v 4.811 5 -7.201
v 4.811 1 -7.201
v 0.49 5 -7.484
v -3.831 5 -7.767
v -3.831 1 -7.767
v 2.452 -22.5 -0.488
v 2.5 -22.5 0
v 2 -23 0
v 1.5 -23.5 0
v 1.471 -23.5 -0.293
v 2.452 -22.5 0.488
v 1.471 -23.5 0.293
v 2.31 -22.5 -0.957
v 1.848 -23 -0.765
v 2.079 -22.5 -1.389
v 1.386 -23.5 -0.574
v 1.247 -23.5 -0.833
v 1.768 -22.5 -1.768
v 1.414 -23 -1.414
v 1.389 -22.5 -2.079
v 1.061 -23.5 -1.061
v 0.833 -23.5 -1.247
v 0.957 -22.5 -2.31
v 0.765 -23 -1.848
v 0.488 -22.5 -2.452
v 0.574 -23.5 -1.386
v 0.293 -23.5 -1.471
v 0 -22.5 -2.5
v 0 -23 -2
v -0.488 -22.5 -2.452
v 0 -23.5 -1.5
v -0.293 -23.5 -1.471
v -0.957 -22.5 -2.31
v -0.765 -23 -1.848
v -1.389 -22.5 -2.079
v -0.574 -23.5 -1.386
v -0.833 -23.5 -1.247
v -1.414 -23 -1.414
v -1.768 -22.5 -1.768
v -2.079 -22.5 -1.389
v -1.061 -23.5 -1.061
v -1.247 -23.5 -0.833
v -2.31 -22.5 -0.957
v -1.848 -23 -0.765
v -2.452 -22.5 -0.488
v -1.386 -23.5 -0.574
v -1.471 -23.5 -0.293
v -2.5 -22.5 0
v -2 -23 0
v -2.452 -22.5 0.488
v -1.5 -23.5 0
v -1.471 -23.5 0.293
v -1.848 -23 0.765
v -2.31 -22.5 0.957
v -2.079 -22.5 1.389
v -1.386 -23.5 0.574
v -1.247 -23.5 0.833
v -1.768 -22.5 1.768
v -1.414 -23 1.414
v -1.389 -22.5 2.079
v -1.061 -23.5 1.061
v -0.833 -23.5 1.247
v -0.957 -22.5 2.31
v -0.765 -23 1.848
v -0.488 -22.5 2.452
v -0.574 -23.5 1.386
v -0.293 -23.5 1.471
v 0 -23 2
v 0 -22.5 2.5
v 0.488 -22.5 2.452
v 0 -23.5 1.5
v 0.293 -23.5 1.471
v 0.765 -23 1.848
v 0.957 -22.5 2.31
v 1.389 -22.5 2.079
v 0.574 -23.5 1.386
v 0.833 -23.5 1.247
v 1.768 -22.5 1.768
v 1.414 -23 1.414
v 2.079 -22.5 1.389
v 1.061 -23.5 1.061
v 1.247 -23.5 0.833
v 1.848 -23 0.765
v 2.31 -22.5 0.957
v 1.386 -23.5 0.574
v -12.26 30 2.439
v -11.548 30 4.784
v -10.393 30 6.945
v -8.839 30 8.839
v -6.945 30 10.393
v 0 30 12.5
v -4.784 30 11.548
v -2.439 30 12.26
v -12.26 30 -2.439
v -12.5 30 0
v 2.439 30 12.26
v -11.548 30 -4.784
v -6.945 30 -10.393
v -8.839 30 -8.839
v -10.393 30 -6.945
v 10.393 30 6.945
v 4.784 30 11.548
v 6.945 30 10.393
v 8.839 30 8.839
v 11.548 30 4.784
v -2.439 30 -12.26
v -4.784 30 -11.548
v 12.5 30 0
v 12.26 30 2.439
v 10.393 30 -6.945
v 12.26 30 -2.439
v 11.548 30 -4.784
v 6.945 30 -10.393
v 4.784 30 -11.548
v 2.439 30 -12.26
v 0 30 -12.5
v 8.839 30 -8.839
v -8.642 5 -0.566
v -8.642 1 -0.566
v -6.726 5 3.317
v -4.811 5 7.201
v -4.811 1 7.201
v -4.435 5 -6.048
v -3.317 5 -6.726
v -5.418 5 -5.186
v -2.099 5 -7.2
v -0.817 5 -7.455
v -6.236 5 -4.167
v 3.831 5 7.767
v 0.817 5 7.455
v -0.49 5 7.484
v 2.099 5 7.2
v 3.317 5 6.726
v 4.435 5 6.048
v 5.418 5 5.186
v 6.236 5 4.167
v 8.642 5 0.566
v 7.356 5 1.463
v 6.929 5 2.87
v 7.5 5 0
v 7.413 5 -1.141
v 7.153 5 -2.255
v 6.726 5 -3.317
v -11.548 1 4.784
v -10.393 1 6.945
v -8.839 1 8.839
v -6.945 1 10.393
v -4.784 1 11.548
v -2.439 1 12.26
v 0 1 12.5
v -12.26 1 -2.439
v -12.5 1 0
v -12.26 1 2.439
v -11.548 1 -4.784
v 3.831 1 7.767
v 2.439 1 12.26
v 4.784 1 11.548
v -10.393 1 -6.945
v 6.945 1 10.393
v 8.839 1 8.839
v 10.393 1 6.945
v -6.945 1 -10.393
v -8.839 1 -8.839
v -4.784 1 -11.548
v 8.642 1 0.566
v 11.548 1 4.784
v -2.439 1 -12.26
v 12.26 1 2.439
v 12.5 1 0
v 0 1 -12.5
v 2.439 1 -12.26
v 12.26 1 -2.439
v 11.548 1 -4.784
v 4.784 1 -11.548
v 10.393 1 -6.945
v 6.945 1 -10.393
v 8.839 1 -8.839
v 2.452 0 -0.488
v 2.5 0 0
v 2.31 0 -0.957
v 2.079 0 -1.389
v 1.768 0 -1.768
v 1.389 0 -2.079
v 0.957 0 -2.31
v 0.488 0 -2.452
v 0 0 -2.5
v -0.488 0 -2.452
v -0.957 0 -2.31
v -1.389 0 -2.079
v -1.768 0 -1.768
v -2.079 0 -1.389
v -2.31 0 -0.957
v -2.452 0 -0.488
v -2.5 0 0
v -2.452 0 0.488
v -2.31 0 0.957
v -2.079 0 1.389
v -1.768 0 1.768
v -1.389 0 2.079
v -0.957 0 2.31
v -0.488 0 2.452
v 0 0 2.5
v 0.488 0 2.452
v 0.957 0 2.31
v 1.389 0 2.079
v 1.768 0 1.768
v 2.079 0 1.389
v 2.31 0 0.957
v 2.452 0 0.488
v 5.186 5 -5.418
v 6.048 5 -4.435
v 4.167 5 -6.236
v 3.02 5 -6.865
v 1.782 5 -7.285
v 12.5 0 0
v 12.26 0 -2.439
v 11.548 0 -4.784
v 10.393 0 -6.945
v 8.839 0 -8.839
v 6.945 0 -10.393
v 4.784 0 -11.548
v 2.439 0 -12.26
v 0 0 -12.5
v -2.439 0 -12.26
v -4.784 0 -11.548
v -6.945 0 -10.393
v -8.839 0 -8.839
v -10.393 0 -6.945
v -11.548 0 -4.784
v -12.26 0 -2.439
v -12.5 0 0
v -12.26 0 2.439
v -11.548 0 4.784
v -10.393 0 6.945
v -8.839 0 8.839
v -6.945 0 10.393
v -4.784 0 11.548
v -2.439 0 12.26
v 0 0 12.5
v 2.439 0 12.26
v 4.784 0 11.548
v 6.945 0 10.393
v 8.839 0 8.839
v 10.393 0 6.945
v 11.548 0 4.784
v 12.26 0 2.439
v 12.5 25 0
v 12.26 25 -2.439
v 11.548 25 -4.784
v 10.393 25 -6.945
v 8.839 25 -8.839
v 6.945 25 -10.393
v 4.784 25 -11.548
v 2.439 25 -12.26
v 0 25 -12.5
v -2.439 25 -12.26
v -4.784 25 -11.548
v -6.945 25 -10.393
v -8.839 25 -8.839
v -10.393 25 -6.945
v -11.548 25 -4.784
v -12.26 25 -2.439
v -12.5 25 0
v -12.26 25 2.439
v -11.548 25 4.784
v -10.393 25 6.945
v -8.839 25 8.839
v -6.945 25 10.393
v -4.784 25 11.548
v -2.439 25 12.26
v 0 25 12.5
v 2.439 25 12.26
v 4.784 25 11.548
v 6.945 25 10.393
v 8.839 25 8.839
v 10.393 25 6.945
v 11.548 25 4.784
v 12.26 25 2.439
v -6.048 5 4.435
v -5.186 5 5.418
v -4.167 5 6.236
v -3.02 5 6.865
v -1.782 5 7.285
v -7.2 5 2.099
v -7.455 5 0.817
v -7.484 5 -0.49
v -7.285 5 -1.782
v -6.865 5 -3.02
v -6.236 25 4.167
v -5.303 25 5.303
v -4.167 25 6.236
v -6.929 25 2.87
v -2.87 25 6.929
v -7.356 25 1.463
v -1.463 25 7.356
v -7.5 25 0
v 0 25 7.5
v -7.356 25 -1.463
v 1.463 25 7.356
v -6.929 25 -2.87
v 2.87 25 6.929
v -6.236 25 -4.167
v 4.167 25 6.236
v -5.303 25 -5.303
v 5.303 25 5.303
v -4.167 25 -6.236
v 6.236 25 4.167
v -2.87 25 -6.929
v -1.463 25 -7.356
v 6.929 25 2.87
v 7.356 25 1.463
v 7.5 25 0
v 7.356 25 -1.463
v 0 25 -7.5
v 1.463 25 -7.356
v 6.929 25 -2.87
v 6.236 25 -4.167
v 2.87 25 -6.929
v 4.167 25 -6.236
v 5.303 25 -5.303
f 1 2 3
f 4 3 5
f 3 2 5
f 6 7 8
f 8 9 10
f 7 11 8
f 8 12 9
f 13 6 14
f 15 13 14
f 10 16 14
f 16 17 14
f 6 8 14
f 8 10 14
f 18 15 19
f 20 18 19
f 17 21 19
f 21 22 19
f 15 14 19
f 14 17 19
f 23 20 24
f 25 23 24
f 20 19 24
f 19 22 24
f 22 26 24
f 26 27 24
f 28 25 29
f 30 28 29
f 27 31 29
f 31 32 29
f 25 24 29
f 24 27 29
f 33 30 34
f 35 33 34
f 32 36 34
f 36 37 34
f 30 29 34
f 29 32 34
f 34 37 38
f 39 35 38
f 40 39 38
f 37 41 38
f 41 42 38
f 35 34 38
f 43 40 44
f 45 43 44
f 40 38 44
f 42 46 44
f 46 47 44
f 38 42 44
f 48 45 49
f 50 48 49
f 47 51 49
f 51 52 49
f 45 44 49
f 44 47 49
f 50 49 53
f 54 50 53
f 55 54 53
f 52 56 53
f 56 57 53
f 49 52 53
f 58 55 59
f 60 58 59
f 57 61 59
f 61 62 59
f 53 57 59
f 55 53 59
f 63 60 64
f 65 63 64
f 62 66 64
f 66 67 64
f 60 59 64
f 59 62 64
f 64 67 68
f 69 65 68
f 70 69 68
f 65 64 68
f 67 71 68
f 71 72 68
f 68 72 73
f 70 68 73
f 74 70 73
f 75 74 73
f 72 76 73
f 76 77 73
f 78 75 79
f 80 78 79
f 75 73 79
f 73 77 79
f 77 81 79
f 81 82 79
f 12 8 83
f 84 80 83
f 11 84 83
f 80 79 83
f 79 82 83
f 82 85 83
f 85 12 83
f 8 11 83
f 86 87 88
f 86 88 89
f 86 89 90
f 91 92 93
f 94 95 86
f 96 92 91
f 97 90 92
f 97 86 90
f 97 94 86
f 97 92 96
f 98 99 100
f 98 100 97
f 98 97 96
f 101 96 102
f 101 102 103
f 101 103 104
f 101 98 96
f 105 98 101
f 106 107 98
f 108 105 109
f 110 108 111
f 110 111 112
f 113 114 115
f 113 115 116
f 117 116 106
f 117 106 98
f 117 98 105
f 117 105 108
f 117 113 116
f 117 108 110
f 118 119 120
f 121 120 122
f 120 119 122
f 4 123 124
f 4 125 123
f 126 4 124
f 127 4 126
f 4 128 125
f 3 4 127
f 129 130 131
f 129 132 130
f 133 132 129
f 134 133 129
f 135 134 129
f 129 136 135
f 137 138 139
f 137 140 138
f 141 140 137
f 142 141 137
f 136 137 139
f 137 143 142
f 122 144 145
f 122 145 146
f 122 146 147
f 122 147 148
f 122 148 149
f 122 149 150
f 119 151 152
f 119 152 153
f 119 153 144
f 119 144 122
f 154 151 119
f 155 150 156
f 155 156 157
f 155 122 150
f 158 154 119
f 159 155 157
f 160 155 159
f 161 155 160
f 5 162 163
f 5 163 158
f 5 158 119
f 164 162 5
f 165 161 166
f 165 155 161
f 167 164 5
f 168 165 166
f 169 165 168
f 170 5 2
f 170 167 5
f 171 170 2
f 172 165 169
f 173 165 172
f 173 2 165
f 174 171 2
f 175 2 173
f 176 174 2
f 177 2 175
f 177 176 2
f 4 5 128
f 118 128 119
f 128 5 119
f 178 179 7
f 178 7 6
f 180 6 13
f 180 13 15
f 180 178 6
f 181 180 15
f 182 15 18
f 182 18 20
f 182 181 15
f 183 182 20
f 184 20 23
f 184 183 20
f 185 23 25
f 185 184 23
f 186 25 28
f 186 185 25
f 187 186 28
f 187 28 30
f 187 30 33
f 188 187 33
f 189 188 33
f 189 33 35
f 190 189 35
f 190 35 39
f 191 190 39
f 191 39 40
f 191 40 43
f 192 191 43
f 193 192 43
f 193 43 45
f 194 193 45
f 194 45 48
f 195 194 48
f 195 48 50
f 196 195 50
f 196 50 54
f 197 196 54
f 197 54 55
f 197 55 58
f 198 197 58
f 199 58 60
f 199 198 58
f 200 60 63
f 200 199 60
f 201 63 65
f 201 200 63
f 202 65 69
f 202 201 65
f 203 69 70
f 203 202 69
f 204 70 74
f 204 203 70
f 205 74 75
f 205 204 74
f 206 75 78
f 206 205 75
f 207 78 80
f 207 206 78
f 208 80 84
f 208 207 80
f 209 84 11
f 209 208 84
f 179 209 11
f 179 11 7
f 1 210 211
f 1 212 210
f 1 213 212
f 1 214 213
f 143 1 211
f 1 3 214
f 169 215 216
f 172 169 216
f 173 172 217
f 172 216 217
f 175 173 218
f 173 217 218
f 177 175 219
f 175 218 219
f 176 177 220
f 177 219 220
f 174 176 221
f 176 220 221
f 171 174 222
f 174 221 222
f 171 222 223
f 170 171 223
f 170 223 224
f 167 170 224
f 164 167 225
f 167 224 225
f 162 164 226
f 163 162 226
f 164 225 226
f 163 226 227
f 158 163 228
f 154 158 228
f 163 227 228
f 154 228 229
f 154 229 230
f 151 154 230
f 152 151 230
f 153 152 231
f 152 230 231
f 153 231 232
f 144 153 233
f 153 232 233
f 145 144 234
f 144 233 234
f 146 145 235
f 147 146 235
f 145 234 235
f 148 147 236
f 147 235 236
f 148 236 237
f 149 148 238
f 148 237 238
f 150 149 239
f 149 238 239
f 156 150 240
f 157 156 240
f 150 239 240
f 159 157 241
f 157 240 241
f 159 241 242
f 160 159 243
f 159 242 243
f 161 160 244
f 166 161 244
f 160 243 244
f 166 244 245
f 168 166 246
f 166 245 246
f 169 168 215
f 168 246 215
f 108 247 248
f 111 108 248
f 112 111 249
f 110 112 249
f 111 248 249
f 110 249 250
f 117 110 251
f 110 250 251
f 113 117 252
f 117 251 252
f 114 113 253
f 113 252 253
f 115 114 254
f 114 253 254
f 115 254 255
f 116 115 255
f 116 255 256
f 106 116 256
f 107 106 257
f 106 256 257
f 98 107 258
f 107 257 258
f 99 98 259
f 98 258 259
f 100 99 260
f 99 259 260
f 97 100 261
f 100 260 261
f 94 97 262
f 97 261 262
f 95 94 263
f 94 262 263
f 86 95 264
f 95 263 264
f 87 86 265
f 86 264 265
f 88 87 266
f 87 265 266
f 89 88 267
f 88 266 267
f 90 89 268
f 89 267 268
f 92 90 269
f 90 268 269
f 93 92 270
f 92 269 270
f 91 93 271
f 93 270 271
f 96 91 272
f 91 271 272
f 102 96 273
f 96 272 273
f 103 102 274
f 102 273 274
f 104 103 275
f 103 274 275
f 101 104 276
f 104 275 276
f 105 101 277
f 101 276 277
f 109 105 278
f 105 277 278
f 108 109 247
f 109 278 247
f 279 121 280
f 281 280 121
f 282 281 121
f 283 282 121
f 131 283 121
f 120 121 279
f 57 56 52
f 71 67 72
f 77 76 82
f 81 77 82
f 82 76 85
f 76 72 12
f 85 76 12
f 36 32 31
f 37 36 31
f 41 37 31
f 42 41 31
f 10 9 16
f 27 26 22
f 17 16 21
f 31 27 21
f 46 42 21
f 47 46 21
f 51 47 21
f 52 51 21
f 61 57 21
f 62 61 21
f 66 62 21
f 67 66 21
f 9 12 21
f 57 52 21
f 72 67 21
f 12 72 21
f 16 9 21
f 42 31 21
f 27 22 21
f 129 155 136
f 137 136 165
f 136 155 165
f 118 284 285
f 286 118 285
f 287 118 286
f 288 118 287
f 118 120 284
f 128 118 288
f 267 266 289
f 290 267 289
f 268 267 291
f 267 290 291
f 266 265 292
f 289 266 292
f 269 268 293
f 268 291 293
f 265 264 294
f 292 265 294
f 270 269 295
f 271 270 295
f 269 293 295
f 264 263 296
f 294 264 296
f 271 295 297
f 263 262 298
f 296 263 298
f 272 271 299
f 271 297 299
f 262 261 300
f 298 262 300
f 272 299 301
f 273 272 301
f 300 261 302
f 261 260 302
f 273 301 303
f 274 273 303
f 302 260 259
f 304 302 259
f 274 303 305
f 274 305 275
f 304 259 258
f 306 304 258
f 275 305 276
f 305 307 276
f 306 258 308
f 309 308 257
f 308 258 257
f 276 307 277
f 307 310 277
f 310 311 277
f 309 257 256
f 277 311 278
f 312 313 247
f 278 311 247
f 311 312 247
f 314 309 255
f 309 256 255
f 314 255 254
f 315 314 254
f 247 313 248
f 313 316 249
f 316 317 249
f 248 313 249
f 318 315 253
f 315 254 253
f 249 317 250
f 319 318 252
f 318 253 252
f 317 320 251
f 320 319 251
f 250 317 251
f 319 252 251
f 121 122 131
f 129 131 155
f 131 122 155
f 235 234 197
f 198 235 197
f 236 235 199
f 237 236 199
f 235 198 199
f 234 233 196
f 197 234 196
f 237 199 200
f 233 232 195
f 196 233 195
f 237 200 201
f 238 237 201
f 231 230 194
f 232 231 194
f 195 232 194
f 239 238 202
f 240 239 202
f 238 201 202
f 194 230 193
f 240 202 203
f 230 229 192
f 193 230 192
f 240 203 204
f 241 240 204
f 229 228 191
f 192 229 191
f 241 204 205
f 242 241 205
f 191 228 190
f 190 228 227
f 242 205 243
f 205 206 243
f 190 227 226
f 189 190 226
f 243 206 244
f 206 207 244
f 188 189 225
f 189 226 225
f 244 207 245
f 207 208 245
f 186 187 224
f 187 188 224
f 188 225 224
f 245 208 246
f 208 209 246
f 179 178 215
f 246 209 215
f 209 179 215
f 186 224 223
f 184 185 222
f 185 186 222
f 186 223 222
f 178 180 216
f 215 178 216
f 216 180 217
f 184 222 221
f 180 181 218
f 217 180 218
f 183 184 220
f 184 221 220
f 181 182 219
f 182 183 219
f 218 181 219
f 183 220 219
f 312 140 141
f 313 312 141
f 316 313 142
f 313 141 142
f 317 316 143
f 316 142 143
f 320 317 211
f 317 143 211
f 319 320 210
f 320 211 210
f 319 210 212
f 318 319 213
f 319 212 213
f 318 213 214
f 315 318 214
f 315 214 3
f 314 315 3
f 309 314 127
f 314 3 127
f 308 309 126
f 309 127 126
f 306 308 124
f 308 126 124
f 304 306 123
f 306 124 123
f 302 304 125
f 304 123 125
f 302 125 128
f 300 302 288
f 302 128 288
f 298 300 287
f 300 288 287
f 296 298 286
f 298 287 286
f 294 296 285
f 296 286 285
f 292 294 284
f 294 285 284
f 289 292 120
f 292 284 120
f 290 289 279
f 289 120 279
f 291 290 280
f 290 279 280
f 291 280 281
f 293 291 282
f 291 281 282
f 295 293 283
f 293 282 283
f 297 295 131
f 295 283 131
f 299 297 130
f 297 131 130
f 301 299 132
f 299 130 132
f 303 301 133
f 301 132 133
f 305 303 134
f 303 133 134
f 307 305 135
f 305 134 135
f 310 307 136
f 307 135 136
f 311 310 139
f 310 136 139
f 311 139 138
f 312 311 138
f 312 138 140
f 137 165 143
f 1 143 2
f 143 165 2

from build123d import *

# Parameters (mm, degrees)
SKETCH1_R           = 12.5
BOSS_EXTRUDE1_DEPTH = 1
BOSS_EXTRUDE2_DEPTH = 4
SKETCH4_R           = 2.5
BOSS_EXTRUDE3_DEPTH = 28.5
CHAMFER1_SIZE       = 1
SKETCH5_R           = 7.5
BOSS_EXTRUDE4_DEPTH = 20
SKETCH6_R           = 12.5
BOSS_EXTRUDE5_DEPTH = 5


with BuildPart() as part:
    # Sketch1 → Boss-Extrude1 (new body)
    with BuildSketch(Plane(origin=(0, 0, 0), x_dir=(1, 0, 0), z_dir=(0, 1, 0))):
        Circle(SKETCH1_R)
    extrude(amount=BOSS_EXTRUDE1_DEPTH)

    # Sketch2 → Boss-Extrude2 (add)
    with BuildSketch(Plane(origin=(0, 1, 0), x_dir=(1, 0, 0), z_dir=(0, 1, 0))):
        Polygon((3.830656369, -7.766986017), (8.641735386, -0.56604728), (4.811079017, 7.200938737), (-3.830656369, 7.766986017), (-8.641735386, 0.56604728), (-4.811079017, -7.200938737), align=None)
    extrude(amount=BOSS_EXTRUDE2_DEPTH)

    # Sketch4 → Boss-Extrude3 (add)
    with BuildSketch(Plane(origin=(0, 5, 0), x_dir=(1, 0, 0), z_dir=(0, 1, 0))):
        Circle(SKETCH4_R)
    extrude(amount=-BOSS_EXTRUDE3_DEPTH)

    # Chamfer1
    chamfer1_edges = [part.edges().sort_by_distance(p)[0] for p in [
        (-2.5, -23.5, 0),
    ]]
    chamfer(chamfer1_edges, length=CHAMFER1_SIZE)

    # Sketch5 → Boss-Extrude4 (add)
    with BuildSketch(Plane(origin=(0, 5, 0), x_dir=(1, 0, 0), z_dir=(0, 1, 0))):
        Circle(SKETCH5_R)
    extrude(amount=BOSS_EXTRUDE4_DEPTH)

    # Sketch6 → Boss-Extrude5 (add)
    with BuildSketch(Plane(origin=(0, 25, 0), x_dir=(1, 0, 0), z_dir=(0, 1, 0))):
        Circle(SKETCH6_R)
    extrude(amount=BOSS_EXTRUDE5_DEPTH)


solid = part.part
